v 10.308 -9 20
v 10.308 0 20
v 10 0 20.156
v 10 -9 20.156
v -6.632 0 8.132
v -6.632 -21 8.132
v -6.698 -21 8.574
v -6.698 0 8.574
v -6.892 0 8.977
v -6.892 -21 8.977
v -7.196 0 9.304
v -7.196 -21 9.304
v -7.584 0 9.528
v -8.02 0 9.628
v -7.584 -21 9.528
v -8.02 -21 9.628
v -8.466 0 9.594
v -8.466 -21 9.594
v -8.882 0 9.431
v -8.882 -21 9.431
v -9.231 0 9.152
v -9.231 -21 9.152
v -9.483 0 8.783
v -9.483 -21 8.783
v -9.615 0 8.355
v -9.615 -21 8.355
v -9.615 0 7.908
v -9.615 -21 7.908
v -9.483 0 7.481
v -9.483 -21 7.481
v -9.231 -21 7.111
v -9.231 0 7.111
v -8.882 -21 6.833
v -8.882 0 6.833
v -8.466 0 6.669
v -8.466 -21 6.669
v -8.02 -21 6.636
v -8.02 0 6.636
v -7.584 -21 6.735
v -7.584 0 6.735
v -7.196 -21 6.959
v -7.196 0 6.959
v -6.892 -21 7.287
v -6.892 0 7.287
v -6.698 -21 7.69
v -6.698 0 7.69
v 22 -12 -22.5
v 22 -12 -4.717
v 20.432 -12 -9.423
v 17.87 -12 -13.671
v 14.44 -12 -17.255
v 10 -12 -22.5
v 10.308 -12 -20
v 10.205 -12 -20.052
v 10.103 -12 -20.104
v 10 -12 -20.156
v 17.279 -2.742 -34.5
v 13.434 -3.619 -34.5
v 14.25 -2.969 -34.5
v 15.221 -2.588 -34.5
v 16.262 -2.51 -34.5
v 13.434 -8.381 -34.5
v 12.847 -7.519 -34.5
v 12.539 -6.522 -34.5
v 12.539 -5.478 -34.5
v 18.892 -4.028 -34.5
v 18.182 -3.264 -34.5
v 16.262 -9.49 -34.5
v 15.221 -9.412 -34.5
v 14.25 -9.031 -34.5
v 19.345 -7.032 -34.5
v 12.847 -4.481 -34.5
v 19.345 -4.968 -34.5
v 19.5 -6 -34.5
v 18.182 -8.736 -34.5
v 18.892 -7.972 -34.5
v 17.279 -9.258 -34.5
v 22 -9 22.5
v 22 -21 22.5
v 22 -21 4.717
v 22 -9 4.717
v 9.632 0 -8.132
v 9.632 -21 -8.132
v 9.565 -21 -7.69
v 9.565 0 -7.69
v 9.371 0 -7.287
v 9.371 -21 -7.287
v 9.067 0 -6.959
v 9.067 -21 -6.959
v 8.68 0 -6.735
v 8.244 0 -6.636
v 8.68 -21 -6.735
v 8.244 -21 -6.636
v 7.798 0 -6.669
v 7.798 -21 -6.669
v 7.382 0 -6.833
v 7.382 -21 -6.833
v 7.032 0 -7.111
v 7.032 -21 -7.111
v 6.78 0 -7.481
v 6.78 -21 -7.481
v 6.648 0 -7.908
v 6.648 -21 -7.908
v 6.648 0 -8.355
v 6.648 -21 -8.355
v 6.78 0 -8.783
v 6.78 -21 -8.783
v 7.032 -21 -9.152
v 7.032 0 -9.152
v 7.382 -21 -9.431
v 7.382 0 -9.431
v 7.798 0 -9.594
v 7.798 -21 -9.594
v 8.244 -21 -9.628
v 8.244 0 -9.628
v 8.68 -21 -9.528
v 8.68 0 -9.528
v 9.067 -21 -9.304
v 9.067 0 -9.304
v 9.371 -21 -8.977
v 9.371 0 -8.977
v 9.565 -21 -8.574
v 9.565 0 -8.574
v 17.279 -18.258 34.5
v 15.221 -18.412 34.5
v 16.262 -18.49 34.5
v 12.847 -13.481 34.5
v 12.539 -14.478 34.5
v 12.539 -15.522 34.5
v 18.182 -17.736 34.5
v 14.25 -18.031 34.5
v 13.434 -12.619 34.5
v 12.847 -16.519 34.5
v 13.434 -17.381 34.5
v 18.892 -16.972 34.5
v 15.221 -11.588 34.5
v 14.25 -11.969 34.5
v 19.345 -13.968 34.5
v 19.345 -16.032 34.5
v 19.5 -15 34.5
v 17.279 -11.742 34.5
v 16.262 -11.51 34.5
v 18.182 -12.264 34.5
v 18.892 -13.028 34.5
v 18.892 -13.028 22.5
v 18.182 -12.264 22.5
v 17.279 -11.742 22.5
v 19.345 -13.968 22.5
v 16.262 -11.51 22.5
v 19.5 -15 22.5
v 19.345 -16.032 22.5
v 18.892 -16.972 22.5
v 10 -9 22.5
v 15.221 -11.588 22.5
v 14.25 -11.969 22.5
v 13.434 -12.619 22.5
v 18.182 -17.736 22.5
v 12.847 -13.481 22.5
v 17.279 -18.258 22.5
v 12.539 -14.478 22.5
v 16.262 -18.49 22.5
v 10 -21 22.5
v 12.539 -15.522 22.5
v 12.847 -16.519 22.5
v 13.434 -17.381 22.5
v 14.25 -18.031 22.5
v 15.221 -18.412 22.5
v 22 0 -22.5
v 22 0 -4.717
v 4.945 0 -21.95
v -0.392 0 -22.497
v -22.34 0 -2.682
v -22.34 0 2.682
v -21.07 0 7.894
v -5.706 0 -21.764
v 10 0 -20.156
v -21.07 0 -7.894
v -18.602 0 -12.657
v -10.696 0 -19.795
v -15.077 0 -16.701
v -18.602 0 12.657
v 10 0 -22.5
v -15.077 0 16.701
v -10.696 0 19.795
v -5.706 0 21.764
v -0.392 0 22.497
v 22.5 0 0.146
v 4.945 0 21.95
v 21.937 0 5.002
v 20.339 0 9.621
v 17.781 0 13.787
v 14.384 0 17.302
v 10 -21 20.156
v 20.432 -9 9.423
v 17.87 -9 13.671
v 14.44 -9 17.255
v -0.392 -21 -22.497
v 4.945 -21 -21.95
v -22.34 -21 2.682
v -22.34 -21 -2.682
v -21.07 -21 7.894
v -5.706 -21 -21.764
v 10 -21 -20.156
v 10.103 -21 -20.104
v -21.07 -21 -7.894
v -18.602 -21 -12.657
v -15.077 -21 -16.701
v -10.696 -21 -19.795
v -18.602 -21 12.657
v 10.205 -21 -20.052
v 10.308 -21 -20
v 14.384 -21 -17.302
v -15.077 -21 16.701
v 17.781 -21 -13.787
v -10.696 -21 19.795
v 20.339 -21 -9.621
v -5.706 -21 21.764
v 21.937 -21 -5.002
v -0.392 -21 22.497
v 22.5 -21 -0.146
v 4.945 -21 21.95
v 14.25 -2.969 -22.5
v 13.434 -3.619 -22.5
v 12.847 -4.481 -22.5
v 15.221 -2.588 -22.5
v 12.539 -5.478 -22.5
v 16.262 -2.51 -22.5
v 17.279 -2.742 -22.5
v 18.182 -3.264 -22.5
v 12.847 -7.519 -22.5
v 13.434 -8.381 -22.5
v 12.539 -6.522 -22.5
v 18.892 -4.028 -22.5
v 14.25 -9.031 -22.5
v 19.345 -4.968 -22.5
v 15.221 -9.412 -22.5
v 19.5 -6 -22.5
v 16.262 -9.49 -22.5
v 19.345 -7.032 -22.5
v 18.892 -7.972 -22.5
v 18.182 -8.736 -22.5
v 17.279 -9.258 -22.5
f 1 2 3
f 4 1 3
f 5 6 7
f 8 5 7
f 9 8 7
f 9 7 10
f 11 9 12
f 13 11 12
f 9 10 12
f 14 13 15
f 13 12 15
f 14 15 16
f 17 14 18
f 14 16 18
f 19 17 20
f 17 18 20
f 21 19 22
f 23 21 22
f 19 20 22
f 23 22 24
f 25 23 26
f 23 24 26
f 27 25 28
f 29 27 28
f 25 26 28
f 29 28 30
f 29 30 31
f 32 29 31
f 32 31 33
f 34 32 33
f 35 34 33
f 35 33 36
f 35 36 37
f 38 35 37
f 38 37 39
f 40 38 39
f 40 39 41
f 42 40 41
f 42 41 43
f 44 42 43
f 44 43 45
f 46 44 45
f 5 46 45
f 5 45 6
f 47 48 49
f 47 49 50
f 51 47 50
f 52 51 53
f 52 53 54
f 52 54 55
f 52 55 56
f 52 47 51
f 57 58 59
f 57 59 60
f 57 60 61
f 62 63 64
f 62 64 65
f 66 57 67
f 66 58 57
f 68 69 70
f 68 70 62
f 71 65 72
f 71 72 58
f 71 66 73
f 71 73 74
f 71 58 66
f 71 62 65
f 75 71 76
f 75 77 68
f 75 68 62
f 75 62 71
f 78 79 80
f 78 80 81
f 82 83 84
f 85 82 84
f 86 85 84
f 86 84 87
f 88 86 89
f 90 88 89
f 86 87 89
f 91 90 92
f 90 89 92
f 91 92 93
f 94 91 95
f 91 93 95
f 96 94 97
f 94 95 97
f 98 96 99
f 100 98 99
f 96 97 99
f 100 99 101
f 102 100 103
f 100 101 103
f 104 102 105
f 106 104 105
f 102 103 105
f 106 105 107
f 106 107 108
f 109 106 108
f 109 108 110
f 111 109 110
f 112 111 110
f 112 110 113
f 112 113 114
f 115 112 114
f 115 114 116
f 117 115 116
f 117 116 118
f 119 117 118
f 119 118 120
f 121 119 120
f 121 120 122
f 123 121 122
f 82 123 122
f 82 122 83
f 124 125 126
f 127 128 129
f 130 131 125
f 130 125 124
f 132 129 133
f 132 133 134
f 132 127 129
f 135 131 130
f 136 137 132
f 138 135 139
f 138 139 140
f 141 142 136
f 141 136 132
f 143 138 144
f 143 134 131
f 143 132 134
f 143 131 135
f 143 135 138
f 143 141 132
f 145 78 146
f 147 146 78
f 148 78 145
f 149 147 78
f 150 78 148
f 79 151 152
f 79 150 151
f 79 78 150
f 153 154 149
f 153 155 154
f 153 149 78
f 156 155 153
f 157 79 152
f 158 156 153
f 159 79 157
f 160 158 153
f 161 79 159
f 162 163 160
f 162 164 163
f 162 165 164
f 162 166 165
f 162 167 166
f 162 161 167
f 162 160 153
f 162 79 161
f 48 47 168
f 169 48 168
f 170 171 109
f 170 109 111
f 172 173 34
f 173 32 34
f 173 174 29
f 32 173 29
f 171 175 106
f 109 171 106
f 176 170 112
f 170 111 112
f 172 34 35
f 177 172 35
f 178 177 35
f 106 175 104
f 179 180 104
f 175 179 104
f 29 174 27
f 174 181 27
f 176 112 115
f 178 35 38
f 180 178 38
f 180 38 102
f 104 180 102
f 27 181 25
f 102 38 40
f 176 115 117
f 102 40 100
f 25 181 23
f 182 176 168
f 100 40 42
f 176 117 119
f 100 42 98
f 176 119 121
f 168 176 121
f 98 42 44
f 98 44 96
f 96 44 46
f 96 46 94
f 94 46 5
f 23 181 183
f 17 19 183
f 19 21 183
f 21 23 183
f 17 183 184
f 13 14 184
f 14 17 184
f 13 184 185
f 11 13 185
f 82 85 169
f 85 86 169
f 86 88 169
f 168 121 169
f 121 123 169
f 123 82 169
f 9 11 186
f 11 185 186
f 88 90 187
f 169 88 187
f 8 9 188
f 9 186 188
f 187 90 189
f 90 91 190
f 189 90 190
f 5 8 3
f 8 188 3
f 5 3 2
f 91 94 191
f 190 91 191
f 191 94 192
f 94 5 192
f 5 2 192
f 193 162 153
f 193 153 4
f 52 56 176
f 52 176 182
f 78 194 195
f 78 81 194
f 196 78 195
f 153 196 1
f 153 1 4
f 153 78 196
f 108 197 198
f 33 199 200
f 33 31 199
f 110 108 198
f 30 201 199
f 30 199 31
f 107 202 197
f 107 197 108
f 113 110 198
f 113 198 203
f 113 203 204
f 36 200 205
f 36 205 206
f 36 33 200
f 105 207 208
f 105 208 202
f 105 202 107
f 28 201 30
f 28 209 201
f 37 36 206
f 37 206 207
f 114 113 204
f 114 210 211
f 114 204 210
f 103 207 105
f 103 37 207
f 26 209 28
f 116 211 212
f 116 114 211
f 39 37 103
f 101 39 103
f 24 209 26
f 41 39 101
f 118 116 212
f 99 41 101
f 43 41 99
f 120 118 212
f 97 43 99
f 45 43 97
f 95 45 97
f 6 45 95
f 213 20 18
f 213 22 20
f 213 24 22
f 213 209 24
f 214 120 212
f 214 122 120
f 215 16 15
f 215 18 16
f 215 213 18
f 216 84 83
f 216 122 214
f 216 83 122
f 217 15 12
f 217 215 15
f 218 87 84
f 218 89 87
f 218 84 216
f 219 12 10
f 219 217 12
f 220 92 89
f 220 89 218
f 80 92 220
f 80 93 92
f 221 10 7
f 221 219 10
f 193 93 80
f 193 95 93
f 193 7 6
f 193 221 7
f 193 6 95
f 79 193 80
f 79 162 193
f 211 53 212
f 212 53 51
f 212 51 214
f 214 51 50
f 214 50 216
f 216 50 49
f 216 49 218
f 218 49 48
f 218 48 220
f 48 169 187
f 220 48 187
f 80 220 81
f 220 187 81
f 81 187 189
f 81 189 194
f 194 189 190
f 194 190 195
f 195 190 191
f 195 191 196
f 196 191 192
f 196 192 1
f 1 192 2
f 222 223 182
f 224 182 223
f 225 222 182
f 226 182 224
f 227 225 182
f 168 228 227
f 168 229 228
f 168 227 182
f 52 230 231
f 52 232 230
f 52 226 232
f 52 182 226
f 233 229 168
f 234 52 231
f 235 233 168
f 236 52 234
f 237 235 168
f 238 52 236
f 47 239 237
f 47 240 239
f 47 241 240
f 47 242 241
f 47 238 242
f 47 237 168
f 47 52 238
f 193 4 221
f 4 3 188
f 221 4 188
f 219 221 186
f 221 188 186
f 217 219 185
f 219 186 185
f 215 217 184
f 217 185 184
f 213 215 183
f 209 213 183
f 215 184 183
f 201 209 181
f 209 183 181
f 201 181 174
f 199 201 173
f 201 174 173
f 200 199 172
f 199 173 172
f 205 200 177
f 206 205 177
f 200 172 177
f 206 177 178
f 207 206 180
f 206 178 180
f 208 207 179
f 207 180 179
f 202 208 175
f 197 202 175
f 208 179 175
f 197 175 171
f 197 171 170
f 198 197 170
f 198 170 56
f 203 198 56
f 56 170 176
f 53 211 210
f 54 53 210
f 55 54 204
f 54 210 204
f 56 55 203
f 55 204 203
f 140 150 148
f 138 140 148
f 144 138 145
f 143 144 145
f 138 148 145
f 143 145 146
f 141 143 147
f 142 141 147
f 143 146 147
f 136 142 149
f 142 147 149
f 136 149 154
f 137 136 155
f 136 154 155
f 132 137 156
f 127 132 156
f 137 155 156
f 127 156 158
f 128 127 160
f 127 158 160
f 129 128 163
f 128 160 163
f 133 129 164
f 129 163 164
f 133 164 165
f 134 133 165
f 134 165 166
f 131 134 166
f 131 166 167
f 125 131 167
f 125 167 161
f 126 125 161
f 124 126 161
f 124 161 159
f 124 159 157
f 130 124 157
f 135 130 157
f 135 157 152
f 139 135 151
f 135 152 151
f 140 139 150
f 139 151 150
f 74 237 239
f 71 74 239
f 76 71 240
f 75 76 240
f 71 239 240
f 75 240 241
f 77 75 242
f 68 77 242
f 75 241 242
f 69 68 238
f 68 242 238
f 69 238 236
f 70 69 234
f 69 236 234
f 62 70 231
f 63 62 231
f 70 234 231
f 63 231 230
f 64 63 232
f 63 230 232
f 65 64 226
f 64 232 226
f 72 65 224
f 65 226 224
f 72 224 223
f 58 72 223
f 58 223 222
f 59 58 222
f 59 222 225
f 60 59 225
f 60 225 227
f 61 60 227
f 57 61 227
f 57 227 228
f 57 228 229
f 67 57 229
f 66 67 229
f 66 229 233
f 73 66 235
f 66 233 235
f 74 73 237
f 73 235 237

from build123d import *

# Parameters (mm, degrees)
F0_R      = 22.5
F1_DEPTH  = 21
F3_DEPTH  = 21
F6_DEPTH  = 9
F4_R      = 3.5
F7_DEPTH  = 12
F8_DEPTH  = 20
F9_DEPTH  = 9
F11_DEPTH = 20
F10_R     = 3.5
F12_DEPTH = 12
F2_R      = 1.5
F13_DEPTH = 21.001


with BuildPart() as f1:
    # F0 (on Front) → F1 (new body)
    with BuildSketch(Plane.XZ):
        Circle(F0_R)
    extrude(amount=F1_DEPTH)

    # F2 (on face) → F3 (join)
    with BuildSketch(Plane.XZ.offset(21)):
        with BuildLine():
            Line((22, 22.5), (10, 22.5))
            Line((10, 22.5), (10, 20.1556443707))
            ThreePointArc((10, 20.1556443707), (10.1541802531, 20.0784118741), (10.307764064, 20))
            Line((10.307764064, 20), (22, 20))
            Line((22, 20), (22, 22.5))
        make_face()
        with BuildLine():
            ThreePointArc((10.307764064, -20), (10.1541802531, -20.0784118741), (10, -20.1556443707))
            Line((10, -20.1556443707), (10, -22.5))
            Line((10, -22.5), (22, -22.5))
            Line((22, -22.5), (22, -20))
            Line((22, -20), (10.307764064, -20))
        make_face()
        with BuildLine():
            ThreePointArc((10.307764064, 20), (10.1541802531, 20.0784118741), (10, 20.1556443707))
            Line((10, 20.1556443707), (10, 20))
            Line((10, 20), (10.307764064, 20))
        make_face()
        with BuildLine():
            Line((10, -20), (10, -20.1556443707))
            ThreePointArc((10, -20.1556443707), (10.1541802531, -20.0784118741), (10.307764064, -20))
            Line((10.307764064, -20), (10, -20))
        make_face()
    extrude(amount=-F3_DEPTH)

    # F5 (on face) → F6 (cut)
    with BuildSketch(Plane(origin=(0, 0, 0), x_dir=(-1, 0, 0), z_dir=(0, 1, 0))):
        Polygon((-10.307764064, 20), (-10, 20.1556443707), (-10, 22.5), (-22, 22.5), (-22, 20), align=None)
    extrude(amount=-F6_DEPTH, mode=Mode.SUBTRACT)

    # F4 (on face) → F7 (join)
    with BuildSketch(Plane.XY.offset(22.5)):
        with Locations((16, -15)):
            Circle(F4_R)
    extrude(amount=F7_DEPTH)

    # F8 (add): a face of the model
    f8_faces = [f1.faces().sort_by_distance(p)[0] for p in [
        (16.153882032, -15, 20),
    ]]
    extrude(f8_faces, amount=F8_DEPTH)

    # F2 (on face) → F9 (cut)
    with BuildSketch(Plane.XZ.offset(21)):
        with BuildLine():
            ThreePointArc((10.307764064, -20), (10.1541802531, -20.0784118741), (10, -20.1556443707))
            Line((10, -20.1556443707), (10, -22.5))
            Line((10, -22.5), (22, -22.5))
            Line((22, -22.5), (22, -20))
            Line((22, -20), (10.307764064, -20))
        make_face()
    extrude(amount=-F9_DEPTH, mode=Mode.SUBTRACT)

    # F11 (add): a face of the model
    f11_faces = [f1.faces().sort_by_distance(p)[0] for p in [
        (16.153882032, -6, -20),
    ]]
    extrude(f11_faces, amount=F11_DEPTH)

    # F10 (on face) → F12 (join)
    with BuildSketch(Plane(origin=(0, 0, -22.5), x_dir=(1, 0, 0), z_dir=(0, 0, -1))):
        with Locations((16, 6)):
            Circle(F10_R)
    extrude(amount=F12_DEPTH)

    # F2 (on face) → F13 (cut, through all)
    with BuildSketch(Plane.XZ.offset(21)):
        with Locations((8.1317279836, -8.1317279836)):
            Circle(F2_R)
        with Locations((-8.1317279836, 8.1317279836)):
            Circle(F2_R)
    extrude(amount=-F13_DEPTH, mode=Mode.SUBTRACT)


solid = f1.part
